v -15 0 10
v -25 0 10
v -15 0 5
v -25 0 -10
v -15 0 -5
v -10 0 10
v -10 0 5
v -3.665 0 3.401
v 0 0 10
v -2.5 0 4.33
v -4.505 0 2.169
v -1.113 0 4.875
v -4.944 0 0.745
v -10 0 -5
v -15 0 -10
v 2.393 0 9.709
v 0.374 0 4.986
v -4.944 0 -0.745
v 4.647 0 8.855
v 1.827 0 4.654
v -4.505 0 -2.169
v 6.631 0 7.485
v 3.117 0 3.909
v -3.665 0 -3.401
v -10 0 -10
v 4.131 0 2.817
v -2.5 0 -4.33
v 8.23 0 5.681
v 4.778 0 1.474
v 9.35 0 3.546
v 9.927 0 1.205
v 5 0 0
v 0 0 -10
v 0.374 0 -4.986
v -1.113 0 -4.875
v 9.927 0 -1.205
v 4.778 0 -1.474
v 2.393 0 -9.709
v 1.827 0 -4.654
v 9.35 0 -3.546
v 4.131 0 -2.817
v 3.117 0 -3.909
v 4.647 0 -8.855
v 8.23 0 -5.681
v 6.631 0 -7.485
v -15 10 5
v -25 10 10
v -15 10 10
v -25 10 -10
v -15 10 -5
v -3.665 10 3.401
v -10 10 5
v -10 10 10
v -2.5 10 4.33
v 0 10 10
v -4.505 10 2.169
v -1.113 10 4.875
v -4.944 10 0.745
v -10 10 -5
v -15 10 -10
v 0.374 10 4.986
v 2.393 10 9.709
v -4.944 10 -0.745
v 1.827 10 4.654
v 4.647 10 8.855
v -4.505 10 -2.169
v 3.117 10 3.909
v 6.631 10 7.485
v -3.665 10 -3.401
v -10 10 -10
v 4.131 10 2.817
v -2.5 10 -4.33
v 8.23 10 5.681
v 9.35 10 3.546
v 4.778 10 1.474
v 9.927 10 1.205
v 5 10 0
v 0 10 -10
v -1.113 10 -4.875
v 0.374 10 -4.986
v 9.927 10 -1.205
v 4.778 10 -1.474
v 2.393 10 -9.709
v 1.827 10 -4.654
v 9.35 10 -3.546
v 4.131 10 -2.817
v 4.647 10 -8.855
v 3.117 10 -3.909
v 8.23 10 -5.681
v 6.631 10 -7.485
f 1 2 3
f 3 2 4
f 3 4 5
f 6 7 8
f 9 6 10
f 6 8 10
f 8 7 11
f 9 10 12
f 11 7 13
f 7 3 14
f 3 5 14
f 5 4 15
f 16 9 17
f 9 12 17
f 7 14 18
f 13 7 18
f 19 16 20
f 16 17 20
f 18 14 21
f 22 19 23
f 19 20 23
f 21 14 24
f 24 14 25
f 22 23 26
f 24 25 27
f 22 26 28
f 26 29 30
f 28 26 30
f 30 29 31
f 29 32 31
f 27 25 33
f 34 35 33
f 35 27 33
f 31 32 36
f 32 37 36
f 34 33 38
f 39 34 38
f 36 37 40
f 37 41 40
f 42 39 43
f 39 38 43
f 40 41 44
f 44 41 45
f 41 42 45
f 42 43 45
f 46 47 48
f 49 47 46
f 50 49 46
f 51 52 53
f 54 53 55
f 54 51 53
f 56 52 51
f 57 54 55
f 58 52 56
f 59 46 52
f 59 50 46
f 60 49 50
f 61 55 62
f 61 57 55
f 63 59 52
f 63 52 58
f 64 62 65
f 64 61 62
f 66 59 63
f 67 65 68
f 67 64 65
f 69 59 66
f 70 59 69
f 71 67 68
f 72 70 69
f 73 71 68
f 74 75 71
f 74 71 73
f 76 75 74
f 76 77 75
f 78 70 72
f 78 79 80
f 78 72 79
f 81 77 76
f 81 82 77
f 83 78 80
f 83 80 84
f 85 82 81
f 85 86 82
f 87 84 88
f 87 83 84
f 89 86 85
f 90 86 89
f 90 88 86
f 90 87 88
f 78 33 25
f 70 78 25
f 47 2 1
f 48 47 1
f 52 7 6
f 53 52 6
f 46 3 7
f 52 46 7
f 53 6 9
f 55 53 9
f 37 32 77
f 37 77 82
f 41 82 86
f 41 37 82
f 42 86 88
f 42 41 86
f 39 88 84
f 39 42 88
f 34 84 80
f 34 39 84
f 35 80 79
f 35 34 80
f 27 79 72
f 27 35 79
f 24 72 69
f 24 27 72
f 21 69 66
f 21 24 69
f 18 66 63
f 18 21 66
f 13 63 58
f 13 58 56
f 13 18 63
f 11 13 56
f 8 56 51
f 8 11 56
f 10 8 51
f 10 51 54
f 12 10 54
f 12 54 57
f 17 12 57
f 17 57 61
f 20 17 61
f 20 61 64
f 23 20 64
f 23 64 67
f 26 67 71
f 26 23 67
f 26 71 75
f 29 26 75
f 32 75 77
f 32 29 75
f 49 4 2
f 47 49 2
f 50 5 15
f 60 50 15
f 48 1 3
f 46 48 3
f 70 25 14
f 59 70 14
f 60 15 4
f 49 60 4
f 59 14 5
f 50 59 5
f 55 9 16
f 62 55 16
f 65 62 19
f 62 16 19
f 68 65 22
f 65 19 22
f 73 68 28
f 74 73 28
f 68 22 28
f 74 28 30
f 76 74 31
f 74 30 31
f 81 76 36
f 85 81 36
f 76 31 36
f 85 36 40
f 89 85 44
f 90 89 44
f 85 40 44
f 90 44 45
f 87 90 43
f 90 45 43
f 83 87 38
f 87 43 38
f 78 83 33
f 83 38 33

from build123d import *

# Parameters (mm, degrees)
SKETCH_1_R      = 5
EXTRUDE_1_DEPTH = 10


with BuildPart() as part:
    # 草圖1 → 填料-伸長1 (new body)
    with BuildSketch(Plane(origin=(0, 0, 0), x_dir=(1, 0, 0), z_dir=(0, 1, 0))):
        with BuildLine():
            ThreePointArc((0, -10), (10, 0), (0, 10))
            Line((0, 10), (-10, 10))
            Line((-10, 10), (-10, 5))
            Line((-10, 5), (-15, 5))
            Line((-15, 5), (-15, 10))
            Line((-15, 10), (-25, 10))
            Line((-25, 10), (-25, -10))
            Line((-25, -10), (-15, -10))
            Line((-15, -10), (-15, -5))
            Line((-15, -5), (-10, -5))
            Line((-10, -5), (-10, -10))
            Line((-10, -10), (0, -10))
        make_face()
        Circle(SKETCH_1_R, mode=Mode.SUBTRACT)
    extrude(amount=EXTRUDE_1_DEPTH)


solid = part.part
